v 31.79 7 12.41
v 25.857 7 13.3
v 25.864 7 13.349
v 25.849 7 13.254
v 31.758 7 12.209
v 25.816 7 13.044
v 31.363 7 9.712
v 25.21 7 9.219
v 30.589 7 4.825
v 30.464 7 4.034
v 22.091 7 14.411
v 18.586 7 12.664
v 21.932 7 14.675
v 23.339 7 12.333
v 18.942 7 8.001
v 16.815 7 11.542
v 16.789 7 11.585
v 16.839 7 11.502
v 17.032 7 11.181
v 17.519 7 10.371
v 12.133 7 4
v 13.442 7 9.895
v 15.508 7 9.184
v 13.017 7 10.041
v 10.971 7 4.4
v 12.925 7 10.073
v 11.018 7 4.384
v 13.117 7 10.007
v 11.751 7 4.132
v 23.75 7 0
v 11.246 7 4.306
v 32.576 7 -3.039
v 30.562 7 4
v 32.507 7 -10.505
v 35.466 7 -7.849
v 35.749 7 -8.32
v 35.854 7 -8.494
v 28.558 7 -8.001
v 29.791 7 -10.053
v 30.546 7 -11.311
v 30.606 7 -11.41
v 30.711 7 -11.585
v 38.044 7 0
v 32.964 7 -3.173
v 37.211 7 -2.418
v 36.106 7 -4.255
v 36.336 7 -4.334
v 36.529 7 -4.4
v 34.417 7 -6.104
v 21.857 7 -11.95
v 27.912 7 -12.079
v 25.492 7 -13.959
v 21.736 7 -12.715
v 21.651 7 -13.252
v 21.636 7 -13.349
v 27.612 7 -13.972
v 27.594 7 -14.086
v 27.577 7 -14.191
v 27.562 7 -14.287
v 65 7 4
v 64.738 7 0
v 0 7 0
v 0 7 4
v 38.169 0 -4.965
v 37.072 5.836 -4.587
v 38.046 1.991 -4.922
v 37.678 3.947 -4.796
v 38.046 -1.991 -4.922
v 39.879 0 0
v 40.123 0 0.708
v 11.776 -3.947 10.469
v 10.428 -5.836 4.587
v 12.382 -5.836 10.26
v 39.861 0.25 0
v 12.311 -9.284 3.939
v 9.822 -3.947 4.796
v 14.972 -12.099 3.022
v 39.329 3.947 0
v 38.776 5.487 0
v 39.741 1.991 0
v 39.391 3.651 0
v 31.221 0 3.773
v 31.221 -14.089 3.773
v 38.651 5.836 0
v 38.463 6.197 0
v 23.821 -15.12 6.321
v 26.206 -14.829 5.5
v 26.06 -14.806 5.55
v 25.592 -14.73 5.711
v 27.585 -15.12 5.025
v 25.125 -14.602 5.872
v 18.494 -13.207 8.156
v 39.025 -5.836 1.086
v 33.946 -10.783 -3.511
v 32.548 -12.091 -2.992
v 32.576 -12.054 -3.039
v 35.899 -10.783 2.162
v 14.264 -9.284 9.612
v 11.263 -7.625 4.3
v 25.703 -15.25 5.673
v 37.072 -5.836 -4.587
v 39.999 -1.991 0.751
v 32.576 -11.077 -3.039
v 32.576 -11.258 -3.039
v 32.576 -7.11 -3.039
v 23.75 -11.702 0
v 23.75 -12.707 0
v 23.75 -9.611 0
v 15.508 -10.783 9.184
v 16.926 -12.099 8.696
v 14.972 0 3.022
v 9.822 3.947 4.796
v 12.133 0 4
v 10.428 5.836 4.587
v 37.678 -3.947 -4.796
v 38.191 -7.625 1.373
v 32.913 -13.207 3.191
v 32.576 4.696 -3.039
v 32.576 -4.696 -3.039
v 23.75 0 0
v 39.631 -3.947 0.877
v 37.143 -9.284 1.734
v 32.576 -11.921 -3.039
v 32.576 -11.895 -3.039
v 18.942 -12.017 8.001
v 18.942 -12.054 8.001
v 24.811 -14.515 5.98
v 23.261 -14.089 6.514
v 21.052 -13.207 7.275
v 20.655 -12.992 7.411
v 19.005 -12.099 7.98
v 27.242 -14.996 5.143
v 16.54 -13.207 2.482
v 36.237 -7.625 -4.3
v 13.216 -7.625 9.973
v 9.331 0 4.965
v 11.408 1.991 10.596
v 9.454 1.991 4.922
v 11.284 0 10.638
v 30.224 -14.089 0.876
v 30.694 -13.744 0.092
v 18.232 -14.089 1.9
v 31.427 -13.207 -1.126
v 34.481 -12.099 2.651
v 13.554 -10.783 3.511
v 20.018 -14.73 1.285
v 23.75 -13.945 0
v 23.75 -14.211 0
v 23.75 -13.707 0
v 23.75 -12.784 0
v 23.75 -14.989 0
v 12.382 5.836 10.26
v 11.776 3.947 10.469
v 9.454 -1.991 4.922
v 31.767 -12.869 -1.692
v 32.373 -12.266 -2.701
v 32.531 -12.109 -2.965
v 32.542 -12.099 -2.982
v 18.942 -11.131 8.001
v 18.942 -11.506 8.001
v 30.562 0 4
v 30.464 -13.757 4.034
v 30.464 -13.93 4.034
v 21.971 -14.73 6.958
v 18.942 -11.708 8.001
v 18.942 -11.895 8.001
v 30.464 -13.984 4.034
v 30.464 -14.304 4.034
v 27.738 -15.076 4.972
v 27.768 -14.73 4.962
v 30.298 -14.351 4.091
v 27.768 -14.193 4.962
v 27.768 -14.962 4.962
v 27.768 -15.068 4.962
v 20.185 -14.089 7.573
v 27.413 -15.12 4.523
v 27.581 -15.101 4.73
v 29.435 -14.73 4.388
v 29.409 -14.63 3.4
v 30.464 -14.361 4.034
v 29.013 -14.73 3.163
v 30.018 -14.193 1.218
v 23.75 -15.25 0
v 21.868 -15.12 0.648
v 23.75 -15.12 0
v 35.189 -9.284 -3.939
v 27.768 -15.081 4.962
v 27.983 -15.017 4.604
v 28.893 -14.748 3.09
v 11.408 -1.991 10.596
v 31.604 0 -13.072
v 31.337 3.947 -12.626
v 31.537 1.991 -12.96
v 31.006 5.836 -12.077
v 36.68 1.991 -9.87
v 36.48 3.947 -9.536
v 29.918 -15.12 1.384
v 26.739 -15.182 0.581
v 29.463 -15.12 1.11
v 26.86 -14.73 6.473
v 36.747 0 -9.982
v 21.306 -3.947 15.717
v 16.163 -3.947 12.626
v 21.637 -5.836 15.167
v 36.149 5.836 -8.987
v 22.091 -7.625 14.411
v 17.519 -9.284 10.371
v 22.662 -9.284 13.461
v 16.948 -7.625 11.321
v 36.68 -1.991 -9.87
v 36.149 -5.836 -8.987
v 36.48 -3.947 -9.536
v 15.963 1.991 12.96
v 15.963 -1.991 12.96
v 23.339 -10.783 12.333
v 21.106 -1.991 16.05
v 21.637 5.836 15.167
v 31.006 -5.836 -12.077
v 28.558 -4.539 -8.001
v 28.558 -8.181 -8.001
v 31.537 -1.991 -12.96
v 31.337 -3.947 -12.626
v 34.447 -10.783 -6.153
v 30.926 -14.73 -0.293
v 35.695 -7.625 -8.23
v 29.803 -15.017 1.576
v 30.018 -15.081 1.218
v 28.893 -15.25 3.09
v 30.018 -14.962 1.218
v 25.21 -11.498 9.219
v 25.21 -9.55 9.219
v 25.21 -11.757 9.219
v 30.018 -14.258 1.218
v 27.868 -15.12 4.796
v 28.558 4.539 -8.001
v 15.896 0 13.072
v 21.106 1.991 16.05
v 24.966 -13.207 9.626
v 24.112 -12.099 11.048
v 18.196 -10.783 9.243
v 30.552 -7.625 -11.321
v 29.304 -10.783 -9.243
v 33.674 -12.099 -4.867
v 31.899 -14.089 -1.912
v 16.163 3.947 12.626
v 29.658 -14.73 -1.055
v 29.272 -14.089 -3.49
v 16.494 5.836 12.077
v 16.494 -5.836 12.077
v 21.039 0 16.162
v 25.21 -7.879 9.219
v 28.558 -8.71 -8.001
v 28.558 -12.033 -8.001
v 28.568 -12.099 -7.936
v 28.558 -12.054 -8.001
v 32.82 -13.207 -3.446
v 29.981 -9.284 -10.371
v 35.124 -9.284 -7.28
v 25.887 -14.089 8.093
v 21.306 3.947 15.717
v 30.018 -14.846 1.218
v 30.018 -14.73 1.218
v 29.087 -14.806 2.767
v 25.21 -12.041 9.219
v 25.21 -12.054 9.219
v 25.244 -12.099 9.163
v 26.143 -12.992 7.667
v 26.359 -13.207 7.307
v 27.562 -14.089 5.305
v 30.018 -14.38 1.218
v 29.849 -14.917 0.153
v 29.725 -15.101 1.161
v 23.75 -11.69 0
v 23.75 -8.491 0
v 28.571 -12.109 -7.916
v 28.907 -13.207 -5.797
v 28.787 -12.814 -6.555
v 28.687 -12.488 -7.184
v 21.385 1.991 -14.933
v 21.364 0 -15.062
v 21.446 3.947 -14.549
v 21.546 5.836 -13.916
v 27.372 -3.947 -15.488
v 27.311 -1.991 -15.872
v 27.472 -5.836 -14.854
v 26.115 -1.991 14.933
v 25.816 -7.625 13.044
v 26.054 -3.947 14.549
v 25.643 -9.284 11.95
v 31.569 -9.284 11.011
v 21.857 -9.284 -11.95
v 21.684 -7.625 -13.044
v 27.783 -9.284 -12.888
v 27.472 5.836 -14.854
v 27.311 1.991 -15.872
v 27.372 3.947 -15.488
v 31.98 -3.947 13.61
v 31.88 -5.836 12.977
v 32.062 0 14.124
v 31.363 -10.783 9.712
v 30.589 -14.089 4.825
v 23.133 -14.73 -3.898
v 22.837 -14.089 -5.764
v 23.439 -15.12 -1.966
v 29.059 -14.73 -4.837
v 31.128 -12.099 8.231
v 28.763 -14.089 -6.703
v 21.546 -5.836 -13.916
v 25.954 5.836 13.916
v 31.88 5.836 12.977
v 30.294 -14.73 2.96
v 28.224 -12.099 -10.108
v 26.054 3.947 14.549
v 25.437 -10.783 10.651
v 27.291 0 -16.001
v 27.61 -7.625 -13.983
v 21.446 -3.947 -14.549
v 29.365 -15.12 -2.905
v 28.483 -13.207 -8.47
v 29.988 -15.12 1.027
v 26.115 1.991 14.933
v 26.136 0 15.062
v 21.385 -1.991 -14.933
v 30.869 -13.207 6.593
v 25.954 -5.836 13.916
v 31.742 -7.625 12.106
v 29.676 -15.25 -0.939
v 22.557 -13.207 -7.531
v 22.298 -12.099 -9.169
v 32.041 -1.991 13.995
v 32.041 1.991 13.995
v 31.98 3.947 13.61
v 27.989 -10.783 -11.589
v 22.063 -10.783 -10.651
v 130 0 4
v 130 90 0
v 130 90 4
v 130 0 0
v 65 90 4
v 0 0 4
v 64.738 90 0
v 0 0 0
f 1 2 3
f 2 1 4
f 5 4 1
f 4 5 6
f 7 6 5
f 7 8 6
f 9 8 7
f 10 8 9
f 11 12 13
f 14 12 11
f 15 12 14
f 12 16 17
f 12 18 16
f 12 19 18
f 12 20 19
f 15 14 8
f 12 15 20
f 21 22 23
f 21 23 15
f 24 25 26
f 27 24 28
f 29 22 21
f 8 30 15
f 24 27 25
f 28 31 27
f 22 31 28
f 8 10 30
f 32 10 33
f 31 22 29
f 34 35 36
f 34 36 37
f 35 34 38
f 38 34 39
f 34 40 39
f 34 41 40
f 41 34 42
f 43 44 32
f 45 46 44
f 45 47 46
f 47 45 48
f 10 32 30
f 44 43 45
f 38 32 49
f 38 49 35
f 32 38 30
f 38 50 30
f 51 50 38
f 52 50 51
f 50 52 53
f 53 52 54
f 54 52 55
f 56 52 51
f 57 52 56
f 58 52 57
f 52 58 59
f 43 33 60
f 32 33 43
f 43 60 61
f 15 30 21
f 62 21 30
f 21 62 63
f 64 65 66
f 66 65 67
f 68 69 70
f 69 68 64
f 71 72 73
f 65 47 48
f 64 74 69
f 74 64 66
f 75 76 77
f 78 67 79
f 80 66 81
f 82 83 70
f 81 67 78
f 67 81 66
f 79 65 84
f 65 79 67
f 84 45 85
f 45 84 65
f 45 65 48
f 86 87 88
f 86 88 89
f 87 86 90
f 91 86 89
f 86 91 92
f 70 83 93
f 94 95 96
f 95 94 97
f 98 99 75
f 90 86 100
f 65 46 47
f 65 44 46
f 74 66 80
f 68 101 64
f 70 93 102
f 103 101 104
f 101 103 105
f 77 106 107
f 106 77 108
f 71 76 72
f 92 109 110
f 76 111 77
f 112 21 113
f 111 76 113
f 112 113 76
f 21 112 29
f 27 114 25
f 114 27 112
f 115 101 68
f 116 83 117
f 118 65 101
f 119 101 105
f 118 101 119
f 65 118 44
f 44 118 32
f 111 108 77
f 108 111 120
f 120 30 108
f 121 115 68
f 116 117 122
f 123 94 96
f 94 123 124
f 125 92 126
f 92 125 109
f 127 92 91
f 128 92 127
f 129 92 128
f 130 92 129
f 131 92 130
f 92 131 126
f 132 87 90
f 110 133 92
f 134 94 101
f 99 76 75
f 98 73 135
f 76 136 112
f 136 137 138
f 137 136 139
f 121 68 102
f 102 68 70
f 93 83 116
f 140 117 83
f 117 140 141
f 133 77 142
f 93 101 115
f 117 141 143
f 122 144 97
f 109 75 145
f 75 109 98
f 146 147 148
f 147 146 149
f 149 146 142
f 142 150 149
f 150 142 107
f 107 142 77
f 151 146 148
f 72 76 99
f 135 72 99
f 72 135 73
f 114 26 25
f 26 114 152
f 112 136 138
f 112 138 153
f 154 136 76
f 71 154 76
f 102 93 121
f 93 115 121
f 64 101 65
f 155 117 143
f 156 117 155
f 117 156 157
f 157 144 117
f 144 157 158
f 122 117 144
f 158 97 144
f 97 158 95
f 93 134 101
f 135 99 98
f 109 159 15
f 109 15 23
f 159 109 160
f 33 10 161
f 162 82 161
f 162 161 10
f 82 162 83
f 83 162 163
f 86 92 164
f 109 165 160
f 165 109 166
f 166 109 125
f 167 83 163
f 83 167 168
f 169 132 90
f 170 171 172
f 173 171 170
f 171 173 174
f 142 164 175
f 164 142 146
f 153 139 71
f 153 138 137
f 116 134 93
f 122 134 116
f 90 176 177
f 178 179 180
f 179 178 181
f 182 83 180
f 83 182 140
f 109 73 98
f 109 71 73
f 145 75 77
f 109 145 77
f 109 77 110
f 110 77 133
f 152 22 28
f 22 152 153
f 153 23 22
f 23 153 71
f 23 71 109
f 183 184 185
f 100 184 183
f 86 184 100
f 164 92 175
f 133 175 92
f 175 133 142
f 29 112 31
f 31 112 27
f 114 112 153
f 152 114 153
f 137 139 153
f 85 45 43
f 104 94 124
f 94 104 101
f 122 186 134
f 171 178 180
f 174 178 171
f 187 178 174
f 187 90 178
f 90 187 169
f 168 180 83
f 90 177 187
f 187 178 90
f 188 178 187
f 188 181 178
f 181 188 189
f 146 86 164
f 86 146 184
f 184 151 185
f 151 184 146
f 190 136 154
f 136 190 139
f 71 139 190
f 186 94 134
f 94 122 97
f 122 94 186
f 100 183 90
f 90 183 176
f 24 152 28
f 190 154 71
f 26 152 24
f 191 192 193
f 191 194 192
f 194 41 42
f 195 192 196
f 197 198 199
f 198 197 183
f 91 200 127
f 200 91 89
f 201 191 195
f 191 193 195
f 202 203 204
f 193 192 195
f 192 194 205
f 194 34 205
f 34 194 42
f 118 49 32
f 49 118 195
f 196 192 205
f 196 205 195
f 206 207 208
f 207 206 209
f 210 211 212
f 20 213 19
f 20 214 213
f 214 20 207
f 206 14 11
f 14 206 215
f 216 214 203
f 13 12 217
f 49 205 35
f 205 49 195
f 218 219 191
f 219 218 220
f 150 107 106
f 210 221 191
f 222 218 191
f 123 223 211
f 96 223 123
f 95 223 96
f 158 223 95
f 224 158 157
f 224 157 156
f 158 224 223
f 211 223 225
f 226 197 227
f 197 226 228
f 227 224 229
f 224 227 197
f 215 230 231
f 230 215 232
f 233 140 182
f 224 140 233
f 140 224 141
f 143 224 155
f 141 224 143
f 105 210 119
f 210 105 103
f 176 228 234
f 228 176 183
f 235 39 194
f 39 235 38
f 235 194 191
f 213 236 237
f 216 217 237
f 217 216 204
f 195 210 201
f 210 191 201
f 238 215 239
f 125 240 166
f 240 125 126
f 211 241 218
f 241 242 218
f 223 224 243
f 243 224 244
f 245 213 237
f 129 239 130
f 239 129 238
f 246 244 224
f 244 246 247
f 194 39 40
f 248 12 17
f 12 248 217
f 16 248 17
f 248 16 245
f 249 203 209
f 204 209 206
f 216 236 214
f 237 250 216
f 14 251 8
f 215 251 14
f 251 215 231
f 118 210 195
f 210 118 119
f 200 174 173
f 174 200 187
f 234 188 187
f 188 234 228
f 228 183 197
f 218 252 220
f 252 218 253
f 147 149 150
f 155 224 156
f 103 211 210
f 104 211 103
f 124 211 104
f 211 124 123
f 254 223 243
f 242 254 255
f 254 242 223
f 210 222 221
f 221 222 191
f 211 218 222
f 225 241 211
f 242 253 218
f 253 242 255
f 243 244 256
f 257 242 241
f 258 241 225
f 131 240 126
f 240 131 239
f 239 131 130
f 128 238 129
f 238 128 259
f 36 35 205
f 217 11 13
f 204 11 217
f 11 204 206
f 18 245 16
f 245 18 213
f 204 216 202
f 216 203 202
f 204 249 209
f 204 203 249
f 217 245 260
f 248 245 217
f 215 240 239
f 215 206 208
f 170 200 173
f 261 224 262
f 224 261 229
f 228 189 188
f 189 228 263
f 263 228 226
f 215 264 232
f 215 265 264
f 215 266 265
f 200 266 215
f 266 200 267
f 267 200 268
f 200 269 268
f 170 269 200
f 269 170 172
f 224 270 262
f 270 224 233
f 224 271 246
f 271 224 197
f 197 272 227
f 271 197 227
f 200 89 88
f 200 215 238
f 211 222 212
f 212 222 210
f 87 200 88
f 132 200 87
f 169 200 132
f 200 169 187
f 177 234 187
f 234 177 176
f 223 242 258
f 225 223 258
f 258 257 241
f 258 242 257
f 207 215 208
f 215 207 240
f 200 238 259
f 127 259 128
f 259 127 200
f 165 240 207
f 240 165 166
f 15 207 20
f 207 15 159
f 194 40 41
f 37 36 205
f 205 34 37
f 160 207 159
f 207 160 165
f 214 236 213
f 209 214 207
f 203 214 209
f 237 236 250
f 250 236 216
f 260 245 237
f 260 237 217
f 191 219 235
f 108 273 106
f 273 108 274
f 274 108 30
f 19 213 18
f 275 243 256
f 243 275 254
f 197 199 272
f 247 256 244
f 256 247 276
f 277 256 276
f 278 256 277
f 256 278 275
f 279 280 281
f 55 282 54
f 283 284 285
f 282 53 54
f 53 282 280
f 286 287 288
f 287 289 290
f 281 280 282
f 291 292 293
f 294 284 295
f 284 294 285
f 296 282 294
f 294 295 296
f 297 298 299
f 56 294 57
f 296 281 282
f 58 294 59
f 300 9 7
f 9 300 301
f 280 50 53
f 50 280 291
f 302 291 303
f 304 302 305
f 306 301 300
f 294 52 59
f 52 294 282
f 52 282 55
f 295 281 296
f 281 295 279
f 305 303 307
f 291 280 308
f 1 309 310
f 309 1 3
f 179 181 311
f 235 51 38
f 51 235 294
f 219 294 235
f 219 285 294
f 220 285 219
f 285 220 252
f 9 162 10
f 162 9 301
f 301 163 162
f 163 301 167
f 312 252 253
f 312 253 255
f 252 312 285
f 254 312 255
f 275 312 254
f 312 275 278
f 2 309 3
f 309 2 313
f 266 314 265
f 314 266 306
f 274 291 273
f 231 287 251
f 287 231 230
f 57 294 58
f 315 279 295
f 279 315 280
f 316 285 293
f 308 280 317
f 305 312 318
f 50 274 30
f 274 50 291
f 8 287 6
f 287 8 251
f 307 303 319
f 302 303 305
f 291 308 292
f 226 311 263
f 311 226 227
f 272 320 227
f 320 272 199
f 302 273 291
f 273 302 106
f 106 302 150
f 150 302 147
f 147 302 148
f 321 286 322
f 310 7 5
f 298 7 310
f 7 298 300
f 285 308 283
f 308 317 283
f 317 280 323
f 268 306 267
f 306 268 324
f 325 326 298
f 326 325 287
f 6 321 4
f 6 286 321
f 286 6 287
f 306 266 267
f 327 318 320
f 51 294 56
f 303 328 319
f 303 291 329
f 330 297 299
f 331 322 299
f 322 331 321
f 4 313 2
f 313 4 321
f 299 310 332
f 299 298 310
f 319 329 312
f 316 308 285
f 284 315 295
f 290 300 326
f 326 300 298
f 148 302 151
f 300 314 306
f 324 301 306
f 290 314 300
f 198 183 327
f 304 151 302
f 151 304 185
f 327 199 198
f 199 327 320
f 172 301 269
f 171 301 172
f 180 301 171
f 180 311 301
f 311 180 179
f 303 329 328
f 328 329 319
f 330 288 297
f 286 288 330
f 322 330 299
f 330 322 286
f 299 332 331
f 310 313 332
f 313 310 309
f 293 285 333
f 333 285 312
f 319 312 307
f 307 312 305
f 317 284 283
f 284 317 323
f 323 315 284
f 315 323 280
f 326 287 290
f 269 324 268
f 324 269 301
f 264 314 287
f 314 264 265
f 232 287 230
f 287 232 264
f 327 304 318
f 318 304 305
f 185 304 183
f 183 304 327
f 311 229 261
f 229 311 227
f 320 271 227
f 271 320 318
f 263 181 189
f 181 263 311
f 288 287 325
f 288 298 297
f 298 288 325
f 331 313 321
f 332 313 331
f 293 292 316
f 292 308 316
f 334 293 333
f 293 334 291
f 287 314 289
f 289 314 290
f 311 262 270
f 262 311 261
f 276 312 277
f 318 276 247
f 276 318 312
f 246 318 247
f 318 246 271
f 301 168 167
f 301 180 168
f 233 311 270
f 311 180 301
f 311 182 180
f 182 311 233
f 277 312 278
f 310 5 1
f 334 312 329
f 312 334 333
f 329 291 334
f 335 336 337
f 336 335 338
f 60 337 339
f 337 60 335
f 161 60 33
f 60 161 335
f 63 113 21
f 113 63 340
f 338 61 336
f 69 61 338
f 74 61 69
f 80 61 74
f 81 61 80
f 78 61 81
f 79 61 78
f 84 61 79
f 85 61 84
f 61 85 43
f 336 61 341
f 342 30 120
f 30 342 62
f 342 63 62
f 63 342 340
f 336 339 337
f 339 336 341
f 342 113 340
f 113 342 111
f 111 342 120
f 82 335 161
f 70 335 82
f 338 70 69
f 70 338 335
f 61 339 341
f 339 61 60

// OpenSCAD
// Lab tube rack - a flat plate with through-bore holes for lab tubes, flanked by open-ended
// walls that support it. NOVEL general part.
//

tube  = 50;
bore  = 30.5;
rows  = 2;
cols  = 3;
pitch = 40;
L     = 130;
W     = 90;
t     = 4;

$fn = 48;

difference() {
    union() {
        cube([L, W, t]);                                              // flat plate
        for (i = [0 : rows - 1])
            translate([0, i * pitch - pitch * 0.5 + W * 0.3, 0])
                rotate([-90, 0, 0])
                    linear_extrude(t + 2) circle(bore / 2);           // through-bore holes
        for (j = [0 : cols - 1])
            translate([L * 0.3 - bore / 2, 0, 0])
                rotate([0, j * pitch - pitch * 0.5 + L * 0.3, 0])
                    linear_extrude(t + 2) circle(bore / 2);
    }
    for (i = [0 : rows - 1])
        translate([0, i * pitch - pitch * 0.5 + W * 0.3, t])
            rotate([-90, 0, 0]) cylinder(h = t + 66, d = L);       // side walls
}
